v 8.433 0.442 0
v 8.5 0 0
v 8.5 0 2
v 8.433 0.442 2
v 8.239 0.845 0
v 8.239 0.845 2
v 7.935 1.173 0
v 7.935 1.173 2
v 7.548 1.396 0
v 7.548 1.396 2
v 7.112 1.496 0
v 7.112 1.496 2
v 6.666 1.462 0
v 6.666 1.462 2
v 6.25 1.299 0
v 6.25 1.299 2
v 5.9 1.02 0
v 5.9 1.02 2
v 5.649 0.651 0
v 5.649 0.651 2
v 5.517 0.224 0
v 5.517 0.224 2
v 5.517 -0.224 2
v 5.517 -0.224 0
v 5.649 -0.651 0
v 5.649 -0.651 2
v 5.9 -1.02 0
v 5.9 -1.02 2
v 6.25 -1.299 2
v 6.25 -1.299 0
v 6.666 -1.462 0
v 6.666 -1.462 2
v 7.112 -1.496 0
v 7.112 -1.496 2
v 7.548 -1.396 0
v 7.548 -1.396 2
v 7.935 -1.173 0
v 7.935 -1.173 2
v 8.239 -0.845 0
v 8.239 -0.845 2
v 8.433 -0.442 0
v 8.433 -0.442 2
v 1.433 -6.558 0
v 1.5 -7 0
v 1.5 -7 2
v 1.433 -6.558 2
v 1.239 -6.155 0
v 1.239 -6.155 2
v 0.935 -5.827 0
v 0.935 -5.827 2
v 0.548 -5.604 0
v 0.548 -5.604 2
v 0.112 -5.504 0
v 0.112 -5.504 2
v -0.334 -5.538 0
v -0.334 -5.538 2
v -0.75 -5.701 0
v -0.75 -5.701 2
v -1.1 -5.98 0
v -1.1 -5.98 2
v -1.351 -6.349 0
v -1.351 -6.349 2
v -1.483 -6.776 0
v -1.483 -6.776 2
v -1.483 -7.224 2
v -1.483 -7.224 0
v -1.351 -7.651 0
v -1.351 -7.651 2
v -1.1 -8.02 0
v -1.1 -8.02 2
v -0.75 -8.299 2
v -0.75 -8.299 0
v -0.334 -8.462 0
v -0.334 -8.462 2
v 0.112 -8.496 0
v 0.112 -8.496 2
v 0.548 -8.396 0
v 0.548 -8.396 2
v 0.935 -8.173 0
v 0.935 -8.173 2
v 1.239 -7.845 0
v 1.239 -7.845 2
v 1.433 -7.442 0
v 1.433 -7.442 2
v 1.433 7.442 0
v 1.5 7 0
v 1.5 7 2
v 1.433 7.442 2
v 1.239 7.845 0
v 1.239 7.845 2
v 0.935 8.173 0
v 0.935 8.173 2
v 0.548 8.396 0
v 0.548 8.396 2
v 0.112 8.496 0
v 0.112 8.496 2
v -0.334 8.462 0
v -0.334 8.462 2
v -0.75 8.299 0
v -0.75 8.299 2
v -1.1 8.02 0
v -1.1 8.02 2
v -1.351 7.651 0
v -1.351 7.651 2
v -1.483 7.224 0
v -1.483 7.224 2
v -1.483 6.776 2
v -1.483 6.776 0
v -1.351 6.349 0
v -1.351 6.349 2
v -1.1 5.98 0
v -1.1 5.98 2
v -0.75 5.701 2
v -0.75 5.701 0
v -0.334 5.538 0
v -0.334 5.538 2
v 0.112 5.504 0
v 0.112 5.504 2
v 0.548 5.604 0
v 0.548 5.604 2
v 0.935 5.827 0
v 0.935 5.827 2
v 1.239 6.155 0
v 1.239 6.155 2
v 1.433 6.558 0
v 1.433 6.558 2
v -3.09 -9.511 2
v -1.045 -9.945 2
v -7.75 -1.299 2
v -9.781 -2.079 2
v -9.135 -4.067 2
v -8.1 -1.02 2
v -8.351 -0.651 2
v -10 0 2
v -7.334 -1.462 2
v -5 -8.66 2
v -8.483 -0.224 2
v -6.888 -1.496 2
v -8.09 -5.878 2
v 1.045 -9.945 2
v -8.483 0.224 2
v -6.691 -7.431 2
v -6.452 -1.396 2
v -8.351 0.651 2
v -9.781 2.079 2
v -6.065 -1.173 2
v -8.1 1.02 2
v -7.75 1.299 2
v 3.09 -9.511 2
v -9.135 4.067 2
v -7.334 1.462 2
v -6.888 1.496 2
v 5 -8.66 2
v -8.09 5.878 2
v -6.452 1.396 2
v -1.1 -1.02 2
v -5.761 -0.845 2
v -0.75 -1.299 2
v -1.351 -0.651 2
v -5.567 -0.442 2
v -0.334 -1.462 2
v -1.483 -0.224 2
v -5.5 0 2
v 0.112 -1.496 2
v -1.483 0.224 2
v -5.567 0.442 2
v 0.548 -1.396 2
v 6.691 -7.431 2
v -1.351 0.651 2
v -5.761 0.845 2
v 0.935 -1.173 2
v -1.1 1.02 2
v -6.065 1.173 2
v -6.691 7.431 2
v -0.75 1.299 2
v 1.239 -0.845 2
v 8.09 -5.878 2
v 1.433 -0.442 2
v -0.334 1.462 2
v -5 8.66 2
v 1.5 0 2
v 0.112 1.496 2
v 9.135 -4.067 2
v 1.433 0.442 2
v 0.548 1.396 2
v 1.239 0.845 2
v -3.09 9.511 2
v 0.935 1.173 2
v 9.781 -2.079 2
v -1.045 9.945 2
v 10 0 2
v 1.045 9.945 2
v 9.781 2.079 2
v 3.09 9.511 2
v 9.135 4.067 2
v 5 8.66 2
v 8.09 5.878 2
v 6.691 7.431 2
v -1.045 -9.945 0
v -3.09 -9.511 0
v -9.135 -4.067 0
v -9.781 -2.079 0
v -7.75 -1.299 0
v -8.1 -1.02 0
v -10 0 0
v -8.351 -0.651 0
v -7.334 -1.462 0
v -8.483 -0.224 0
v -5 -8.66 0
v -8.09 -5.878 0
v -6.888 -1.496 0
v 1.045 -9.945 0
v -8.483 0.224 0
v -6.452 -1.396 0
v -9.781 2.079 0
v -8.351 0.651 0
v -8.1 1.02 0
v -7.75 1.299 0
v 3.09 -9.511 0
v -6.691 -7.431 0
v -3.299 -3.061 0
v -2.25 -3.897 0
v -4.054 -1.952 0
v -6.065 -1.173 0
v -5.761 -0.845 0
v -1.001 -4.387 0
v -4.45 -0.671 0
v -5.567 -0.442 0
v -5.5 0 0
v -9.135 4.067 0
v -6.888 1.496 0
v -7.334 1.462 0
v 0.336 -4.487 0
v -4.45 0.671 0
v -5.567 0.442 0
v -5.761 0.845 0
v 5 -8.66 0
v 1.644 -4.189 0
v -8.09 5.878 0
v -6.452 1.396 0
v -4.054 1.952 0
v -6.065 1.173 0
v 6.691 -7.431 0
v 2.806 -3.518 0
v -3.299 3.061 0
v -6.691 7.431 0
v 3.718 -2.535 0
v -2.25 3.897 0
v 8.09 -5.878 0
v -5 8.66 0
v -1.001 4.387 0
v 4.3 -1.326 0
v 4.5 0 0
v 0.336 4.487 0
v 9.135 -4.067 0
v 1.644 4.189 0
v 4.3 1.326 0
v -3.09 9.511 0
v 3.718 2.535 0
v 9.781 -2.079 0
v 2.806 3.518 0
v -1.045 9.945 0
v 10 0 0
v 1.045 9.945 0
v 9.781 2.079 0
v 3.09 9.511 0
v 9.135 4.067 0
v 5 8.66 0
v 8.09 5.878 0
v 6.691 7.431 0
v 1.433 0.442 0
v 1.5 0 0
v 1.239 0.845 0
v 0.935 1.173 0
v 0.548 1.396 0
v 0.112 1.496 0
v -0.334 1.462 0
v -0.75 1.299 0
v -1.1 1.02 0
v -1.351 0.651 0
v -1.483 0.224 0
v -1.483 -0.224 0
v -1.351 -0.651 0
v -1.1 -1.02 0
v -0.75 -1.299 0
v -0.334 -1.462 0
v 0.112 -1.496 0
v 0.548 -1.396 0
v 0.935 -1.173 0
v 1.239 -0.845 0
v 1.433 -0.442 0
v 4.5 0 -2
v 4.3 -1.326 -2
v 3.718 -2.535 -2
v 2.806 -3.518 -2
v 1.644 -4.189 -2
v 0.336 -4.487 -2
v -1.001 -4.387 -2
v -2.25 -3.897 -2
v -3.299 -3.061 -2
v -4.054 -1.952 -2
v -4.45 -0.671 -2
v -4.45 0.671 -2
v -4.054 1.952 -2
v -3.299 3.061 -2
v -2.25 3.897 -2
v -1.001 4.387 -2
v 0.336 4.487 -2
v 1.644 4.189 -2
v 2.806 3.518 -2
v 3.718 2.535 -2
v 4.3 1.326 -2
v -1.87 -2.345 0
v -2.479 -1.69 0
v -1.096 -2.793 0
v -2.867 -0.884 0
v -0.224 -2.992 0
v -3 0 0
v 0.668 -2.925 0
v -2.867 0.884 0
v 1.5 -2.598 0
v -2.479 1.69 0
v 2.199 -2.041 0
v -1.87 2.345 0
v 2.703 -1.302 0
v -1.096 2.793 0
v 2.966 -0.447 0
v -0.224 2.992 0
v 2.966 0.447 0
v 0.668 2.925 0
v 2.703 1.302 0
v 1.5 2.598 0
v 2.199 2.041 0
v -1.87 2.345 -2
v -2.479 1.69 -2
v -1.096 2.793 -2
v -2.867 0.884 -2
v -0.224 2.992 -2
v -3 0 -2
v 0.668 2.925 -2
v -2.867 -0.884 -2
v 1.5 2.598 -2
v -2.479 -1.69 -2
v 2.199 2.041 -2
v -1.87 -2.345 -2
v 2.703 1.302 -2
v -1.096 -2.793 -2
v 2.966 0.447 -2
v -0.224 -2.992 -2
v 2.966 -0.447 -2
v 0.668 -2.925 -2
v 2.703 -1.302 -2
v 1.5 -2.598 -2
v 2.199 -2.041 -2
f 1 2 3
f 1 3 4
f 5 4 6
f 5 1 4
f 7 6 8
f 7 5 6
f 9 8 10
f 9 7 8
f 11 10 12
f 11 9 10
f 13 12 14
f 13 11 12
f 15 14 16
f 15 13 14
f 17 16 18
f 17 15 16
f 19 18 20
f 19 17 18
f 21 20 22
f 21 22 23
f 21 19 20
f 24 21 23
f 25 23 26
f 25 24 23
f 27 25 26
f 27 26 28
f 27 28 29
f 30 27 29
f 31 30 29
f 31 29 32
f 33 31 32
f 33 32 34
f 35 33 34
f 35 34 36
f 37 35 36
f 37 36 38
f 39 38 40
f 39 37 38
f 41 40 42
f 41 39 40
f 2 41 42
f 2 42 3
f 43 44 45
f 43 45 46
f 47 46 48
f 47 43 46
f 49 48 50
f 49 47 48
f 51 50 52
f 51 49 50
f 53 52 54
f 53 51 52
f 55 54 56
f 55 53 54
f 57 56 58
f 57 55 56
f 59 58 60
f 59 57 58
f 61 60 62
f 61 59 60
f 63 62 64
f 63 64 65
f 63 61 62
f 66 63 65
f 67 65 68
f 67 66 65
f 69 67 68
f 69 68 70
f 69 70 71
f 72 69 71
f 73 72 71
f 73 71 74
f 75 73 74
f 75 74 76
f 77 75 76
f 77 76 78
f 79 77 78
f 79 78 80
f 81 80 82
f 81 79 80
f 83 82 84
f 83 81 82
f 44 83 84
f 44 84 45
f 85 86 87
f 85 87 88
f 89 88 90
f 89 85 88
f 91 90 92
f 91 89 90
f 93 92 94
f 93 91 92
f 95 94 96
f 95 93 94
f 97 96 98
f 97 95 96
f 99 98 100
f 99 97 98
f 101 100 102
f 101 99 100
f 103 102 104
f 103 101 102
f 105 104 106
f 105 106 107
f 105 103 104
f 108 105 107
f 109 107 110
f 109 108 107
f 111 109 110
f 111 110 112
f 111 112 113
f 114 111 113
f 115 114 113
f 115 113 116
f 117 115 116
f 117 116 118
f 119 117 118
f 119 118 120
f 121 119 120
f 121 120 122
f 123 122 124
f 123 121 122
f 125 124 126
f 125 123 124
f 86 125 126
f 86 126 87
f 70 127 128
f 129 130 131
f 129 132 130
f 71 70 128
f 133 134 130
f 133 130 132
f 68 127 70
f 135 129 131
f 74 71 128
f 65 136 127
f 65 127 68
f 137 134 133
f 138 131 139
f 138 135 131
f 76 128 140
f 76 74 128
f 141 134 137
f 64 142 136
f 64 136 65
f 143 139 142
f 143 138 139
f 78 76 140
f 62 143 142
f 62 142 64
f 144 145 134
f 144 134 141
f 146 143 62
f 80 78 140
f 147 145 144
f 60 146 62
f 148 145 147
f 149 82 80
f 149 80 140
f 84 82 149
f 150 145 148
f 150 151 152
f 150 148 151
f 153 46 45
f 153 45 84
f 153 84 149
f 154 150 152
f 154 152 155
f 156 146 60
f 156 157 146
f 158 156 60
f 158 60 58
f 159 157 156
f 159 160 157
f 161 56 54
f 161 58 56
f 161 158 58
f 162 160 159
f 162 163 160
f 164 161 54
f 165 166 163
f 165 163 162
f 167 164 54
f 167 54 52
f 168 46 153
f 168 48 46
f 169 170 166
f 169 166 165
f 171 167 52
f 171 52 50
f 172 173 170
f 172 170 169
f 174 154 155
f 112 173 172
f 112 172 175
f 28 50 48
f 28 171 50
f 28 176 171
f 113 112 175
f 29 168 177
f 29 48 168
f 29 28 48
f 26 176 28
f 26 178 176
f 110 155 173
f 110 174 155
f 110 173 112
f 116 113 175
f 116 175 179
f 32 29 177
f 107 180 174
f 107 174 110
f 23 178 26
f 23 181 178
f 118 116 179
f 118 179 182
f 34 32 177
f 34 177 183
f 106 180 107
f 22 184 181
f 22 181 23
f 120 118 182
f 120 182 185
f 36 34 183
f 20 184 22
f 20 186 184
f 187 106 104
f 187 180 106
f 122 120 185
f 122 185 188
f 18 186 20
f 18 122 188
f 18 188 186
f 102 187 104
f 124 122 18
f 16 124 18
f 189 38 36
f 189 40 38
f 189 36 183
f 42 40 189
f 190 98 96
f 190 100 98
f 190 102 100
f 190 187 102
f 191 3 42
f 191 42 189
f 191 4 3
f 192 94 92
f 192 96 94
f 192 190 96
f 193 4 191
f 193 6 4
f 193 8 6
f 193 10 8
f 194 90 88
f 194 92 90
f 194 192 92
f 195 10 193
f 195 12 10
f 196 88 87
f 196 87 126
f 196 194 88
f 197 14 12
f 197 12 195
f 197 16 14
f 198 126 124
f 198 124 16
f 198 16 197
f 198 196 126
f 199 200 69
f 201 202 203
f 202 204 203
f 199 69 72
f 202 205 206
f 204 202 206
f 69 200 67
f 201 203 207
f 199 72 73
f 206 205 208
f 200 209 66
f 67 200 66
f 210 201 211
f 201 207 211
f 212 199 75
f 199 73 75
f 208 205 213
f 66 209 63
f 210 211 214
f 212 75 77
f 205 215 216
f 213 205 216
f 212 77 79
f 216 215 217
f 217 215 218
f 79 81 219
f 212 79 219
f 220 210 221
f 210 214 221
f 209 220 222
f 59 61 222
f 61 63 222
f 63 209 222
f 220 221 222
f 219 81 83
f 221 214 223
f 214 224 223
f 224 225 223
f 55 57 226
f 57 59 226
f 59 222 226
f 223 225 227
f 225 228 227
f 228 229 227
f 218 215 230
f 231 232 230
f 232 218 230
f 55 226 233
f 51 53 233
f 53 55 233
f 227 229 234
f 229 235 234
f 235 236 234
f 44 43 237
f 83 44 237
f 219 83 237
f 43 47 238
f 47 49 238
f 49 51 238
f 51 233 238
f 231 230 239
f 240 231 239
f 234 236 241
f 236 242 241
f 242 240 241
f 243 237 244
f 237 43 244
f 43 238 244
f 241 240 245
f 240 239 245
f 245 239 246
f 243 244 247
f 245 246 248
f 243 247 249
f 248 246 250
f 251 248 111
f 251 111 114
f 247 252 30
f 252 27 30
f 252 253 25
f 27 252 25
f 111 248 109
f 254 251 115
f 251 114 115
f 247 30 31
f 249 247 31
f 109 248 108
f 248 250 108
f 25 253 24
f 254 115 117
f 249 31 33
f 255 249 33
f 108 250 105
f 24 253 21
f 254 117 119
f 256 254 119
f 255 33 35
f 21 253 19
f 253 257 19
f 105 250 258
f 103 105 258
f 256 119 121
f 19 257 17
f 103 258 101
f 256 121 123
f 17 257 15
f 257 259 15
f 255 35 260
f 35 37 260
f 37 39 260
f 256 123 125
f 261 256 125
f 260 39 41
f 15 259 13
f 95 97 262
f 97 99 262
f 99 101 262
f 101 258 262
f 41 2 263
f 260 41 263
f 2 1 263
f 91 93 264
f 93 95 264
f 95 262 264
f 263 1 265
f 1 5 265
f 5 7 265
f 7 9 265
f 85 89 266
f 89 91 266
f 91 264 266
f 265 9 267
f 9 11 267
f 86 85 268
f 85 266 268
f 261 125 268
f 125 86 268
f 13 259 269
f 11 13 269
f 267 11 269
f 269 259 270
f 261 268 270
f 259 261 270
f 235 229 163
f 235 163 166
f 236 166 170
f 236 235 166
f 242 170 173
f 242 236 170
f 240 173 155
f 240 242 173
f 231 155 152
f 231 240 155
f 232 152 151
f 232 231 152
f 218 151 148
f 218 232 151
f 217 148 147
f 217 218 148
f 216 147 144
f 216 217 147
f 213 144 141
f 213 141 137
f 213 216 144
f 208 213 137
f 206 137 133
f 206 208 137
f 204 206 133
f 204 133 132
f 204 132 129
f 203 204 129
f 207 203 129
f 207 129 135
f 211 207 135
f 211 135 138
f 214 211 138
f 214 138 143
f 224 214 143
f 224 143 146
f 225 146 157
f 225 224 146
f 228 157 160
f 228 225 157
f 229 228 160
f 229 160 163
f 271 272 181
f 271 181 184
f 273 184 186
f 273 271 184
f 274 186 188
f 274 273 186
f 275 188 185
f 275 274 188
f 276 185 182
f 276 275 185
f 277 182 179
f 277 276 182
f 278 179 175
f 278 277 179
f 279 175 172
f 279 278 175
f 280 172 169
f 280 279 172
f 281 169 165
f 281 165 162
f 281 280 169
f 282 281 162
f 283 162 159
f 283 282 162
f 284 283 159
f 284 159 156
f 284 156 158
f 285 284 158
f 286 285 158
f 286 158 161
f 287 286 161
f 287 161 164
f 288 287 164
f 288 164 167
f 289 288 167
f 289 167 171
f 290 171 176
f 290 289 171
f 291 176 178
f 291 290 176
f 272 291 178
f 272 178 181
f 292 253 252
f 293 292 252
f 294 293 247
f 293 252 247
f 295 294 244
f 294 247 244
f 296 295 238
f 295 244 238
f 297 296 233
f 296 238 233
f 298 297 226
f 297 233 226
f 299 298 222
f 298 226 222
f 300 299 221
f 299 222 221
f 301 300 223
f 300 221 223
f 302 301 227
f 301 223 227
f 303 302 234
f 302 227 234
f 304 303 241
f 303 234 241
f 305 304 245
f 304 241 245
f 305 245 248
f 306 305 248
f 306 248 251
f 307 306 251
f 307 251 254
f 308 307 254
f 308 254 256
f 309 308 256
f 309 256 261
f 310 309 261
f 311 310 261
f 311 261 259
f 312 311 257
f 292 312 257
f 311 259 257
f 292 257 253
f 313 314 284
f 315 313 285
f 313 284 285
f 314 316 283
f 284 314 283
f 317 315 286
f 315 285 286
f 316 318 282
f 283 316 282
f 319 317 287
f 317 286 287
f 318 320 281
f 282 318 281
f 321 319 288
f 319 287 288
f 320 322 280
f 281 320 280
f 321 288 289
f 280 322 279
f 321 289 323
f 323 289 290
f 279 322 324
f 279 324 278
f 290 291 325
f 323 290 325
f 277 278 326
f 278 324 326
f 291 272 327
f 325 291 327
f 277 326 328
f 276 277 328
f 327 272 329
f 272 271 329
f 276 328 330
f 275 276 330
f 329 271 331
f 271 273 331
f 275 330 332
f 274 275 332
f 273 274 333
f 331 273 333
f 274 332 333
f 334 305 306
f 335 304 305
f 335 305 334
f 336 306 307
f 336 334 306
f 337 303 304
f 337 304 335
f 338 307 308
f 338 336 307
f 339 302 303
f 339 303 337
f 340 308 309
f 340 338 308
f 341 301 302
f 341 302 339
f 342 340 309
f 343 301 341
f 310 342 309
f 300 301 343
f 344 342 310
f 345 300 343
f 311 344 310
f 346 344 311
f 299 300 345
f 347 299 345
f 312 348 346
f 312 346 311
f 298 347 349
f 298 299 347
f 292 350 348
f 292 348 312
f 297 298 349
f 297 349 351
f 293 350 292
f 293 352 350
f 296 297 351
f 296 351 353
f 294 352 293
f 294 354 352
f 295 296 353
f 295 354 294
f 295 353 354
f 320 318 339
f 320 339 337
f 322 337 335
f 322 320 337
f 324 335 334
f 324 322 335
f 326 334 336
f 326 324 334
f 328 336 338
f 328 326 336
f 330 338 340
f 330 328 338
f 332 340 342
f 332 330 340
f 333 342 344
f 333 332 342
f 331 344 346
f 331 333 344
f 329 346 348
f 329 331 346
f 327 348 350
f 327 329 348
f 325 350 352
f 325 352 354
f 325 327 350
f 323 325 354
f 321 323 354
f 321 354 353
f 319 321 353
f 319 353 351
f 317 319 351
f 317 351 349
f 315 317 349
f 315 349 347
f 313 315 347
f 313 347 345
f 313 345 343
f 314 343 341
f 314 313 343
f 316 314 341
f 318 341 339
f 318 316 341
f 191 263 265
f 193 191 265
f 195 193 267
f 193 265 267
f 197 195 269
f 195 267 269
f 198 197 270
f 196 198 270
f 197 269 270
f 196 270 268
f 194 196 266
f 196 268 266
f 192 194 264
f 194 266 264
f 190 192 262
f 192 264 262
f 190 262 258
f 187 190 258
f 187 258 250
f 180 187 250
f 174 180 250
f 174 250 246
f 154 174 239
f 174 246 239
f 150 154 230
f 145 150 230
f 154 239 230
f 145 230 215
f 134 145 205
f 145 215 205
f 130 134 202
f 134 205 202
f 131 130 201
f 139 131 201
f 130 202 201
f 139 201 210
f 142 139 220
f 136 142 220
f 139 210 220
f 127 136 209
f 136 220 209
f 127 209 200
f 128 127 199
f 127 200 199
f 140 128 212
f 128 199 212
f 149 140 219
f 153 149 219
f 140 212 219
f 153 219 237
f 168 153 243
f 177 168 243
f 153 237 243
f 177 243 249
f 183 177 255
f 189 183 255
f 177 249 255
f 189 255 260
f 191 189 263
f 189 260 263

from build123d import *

# Parameters (mm, degrees)
SKETCH_1_R      = 10
SKETCH_1_R_2    = 1.5
EXTRUDE_1_DEPTH = 2
SKETCH_2_R      = 4.5
SKETCH_2_R_2    = 3
EXTRUDE_2_DEPTH = 2


with BuildPart() as part:
    # 草图1 → 凸台-拉伸1 (new body)
    with BuildSketch(Plane.XY):
        Circle(SKETCH_1_R)
        Circle(SKETCH_1_R_2, mode=Mode.SUBTRACT)
        with Locations((0, 7)):
            Circle(SKETCH_1_R_2, mode=Mode.SUBTRACT)
        with Locations((7, 0)):
            Circle(SKETCH_1_R_2, mode=Mode.SUBTRACT)
        with Locations((0, -7)):
            Circle(SKETCH_1_R_2, mode=Mode.SUBTRACT)
        with Locations((-7, 0)):
            Circle(SKETCH_1_R_2, mode=Mode.SUBTRACT)
    extrude(amount=EXTRUDE_1_DEPTH)

    # 草图2 → 凸台-拉伸2 (add)
    with BuildSketch(Plane(origin=(0, 0, 0), x_dir=(-1, 0, 0), z_dir=(0, 0, -1))):
        with Locations(Location((0, 0, 0), (0, 0, 180))):
            Circle(SKETCH_2_R)
        Circle(SKETCH_2_R_2, mode=Mode.SUBTRACT)
    extrude(amount=EXTRUDE_2_DEPTH)


solid = part.part
